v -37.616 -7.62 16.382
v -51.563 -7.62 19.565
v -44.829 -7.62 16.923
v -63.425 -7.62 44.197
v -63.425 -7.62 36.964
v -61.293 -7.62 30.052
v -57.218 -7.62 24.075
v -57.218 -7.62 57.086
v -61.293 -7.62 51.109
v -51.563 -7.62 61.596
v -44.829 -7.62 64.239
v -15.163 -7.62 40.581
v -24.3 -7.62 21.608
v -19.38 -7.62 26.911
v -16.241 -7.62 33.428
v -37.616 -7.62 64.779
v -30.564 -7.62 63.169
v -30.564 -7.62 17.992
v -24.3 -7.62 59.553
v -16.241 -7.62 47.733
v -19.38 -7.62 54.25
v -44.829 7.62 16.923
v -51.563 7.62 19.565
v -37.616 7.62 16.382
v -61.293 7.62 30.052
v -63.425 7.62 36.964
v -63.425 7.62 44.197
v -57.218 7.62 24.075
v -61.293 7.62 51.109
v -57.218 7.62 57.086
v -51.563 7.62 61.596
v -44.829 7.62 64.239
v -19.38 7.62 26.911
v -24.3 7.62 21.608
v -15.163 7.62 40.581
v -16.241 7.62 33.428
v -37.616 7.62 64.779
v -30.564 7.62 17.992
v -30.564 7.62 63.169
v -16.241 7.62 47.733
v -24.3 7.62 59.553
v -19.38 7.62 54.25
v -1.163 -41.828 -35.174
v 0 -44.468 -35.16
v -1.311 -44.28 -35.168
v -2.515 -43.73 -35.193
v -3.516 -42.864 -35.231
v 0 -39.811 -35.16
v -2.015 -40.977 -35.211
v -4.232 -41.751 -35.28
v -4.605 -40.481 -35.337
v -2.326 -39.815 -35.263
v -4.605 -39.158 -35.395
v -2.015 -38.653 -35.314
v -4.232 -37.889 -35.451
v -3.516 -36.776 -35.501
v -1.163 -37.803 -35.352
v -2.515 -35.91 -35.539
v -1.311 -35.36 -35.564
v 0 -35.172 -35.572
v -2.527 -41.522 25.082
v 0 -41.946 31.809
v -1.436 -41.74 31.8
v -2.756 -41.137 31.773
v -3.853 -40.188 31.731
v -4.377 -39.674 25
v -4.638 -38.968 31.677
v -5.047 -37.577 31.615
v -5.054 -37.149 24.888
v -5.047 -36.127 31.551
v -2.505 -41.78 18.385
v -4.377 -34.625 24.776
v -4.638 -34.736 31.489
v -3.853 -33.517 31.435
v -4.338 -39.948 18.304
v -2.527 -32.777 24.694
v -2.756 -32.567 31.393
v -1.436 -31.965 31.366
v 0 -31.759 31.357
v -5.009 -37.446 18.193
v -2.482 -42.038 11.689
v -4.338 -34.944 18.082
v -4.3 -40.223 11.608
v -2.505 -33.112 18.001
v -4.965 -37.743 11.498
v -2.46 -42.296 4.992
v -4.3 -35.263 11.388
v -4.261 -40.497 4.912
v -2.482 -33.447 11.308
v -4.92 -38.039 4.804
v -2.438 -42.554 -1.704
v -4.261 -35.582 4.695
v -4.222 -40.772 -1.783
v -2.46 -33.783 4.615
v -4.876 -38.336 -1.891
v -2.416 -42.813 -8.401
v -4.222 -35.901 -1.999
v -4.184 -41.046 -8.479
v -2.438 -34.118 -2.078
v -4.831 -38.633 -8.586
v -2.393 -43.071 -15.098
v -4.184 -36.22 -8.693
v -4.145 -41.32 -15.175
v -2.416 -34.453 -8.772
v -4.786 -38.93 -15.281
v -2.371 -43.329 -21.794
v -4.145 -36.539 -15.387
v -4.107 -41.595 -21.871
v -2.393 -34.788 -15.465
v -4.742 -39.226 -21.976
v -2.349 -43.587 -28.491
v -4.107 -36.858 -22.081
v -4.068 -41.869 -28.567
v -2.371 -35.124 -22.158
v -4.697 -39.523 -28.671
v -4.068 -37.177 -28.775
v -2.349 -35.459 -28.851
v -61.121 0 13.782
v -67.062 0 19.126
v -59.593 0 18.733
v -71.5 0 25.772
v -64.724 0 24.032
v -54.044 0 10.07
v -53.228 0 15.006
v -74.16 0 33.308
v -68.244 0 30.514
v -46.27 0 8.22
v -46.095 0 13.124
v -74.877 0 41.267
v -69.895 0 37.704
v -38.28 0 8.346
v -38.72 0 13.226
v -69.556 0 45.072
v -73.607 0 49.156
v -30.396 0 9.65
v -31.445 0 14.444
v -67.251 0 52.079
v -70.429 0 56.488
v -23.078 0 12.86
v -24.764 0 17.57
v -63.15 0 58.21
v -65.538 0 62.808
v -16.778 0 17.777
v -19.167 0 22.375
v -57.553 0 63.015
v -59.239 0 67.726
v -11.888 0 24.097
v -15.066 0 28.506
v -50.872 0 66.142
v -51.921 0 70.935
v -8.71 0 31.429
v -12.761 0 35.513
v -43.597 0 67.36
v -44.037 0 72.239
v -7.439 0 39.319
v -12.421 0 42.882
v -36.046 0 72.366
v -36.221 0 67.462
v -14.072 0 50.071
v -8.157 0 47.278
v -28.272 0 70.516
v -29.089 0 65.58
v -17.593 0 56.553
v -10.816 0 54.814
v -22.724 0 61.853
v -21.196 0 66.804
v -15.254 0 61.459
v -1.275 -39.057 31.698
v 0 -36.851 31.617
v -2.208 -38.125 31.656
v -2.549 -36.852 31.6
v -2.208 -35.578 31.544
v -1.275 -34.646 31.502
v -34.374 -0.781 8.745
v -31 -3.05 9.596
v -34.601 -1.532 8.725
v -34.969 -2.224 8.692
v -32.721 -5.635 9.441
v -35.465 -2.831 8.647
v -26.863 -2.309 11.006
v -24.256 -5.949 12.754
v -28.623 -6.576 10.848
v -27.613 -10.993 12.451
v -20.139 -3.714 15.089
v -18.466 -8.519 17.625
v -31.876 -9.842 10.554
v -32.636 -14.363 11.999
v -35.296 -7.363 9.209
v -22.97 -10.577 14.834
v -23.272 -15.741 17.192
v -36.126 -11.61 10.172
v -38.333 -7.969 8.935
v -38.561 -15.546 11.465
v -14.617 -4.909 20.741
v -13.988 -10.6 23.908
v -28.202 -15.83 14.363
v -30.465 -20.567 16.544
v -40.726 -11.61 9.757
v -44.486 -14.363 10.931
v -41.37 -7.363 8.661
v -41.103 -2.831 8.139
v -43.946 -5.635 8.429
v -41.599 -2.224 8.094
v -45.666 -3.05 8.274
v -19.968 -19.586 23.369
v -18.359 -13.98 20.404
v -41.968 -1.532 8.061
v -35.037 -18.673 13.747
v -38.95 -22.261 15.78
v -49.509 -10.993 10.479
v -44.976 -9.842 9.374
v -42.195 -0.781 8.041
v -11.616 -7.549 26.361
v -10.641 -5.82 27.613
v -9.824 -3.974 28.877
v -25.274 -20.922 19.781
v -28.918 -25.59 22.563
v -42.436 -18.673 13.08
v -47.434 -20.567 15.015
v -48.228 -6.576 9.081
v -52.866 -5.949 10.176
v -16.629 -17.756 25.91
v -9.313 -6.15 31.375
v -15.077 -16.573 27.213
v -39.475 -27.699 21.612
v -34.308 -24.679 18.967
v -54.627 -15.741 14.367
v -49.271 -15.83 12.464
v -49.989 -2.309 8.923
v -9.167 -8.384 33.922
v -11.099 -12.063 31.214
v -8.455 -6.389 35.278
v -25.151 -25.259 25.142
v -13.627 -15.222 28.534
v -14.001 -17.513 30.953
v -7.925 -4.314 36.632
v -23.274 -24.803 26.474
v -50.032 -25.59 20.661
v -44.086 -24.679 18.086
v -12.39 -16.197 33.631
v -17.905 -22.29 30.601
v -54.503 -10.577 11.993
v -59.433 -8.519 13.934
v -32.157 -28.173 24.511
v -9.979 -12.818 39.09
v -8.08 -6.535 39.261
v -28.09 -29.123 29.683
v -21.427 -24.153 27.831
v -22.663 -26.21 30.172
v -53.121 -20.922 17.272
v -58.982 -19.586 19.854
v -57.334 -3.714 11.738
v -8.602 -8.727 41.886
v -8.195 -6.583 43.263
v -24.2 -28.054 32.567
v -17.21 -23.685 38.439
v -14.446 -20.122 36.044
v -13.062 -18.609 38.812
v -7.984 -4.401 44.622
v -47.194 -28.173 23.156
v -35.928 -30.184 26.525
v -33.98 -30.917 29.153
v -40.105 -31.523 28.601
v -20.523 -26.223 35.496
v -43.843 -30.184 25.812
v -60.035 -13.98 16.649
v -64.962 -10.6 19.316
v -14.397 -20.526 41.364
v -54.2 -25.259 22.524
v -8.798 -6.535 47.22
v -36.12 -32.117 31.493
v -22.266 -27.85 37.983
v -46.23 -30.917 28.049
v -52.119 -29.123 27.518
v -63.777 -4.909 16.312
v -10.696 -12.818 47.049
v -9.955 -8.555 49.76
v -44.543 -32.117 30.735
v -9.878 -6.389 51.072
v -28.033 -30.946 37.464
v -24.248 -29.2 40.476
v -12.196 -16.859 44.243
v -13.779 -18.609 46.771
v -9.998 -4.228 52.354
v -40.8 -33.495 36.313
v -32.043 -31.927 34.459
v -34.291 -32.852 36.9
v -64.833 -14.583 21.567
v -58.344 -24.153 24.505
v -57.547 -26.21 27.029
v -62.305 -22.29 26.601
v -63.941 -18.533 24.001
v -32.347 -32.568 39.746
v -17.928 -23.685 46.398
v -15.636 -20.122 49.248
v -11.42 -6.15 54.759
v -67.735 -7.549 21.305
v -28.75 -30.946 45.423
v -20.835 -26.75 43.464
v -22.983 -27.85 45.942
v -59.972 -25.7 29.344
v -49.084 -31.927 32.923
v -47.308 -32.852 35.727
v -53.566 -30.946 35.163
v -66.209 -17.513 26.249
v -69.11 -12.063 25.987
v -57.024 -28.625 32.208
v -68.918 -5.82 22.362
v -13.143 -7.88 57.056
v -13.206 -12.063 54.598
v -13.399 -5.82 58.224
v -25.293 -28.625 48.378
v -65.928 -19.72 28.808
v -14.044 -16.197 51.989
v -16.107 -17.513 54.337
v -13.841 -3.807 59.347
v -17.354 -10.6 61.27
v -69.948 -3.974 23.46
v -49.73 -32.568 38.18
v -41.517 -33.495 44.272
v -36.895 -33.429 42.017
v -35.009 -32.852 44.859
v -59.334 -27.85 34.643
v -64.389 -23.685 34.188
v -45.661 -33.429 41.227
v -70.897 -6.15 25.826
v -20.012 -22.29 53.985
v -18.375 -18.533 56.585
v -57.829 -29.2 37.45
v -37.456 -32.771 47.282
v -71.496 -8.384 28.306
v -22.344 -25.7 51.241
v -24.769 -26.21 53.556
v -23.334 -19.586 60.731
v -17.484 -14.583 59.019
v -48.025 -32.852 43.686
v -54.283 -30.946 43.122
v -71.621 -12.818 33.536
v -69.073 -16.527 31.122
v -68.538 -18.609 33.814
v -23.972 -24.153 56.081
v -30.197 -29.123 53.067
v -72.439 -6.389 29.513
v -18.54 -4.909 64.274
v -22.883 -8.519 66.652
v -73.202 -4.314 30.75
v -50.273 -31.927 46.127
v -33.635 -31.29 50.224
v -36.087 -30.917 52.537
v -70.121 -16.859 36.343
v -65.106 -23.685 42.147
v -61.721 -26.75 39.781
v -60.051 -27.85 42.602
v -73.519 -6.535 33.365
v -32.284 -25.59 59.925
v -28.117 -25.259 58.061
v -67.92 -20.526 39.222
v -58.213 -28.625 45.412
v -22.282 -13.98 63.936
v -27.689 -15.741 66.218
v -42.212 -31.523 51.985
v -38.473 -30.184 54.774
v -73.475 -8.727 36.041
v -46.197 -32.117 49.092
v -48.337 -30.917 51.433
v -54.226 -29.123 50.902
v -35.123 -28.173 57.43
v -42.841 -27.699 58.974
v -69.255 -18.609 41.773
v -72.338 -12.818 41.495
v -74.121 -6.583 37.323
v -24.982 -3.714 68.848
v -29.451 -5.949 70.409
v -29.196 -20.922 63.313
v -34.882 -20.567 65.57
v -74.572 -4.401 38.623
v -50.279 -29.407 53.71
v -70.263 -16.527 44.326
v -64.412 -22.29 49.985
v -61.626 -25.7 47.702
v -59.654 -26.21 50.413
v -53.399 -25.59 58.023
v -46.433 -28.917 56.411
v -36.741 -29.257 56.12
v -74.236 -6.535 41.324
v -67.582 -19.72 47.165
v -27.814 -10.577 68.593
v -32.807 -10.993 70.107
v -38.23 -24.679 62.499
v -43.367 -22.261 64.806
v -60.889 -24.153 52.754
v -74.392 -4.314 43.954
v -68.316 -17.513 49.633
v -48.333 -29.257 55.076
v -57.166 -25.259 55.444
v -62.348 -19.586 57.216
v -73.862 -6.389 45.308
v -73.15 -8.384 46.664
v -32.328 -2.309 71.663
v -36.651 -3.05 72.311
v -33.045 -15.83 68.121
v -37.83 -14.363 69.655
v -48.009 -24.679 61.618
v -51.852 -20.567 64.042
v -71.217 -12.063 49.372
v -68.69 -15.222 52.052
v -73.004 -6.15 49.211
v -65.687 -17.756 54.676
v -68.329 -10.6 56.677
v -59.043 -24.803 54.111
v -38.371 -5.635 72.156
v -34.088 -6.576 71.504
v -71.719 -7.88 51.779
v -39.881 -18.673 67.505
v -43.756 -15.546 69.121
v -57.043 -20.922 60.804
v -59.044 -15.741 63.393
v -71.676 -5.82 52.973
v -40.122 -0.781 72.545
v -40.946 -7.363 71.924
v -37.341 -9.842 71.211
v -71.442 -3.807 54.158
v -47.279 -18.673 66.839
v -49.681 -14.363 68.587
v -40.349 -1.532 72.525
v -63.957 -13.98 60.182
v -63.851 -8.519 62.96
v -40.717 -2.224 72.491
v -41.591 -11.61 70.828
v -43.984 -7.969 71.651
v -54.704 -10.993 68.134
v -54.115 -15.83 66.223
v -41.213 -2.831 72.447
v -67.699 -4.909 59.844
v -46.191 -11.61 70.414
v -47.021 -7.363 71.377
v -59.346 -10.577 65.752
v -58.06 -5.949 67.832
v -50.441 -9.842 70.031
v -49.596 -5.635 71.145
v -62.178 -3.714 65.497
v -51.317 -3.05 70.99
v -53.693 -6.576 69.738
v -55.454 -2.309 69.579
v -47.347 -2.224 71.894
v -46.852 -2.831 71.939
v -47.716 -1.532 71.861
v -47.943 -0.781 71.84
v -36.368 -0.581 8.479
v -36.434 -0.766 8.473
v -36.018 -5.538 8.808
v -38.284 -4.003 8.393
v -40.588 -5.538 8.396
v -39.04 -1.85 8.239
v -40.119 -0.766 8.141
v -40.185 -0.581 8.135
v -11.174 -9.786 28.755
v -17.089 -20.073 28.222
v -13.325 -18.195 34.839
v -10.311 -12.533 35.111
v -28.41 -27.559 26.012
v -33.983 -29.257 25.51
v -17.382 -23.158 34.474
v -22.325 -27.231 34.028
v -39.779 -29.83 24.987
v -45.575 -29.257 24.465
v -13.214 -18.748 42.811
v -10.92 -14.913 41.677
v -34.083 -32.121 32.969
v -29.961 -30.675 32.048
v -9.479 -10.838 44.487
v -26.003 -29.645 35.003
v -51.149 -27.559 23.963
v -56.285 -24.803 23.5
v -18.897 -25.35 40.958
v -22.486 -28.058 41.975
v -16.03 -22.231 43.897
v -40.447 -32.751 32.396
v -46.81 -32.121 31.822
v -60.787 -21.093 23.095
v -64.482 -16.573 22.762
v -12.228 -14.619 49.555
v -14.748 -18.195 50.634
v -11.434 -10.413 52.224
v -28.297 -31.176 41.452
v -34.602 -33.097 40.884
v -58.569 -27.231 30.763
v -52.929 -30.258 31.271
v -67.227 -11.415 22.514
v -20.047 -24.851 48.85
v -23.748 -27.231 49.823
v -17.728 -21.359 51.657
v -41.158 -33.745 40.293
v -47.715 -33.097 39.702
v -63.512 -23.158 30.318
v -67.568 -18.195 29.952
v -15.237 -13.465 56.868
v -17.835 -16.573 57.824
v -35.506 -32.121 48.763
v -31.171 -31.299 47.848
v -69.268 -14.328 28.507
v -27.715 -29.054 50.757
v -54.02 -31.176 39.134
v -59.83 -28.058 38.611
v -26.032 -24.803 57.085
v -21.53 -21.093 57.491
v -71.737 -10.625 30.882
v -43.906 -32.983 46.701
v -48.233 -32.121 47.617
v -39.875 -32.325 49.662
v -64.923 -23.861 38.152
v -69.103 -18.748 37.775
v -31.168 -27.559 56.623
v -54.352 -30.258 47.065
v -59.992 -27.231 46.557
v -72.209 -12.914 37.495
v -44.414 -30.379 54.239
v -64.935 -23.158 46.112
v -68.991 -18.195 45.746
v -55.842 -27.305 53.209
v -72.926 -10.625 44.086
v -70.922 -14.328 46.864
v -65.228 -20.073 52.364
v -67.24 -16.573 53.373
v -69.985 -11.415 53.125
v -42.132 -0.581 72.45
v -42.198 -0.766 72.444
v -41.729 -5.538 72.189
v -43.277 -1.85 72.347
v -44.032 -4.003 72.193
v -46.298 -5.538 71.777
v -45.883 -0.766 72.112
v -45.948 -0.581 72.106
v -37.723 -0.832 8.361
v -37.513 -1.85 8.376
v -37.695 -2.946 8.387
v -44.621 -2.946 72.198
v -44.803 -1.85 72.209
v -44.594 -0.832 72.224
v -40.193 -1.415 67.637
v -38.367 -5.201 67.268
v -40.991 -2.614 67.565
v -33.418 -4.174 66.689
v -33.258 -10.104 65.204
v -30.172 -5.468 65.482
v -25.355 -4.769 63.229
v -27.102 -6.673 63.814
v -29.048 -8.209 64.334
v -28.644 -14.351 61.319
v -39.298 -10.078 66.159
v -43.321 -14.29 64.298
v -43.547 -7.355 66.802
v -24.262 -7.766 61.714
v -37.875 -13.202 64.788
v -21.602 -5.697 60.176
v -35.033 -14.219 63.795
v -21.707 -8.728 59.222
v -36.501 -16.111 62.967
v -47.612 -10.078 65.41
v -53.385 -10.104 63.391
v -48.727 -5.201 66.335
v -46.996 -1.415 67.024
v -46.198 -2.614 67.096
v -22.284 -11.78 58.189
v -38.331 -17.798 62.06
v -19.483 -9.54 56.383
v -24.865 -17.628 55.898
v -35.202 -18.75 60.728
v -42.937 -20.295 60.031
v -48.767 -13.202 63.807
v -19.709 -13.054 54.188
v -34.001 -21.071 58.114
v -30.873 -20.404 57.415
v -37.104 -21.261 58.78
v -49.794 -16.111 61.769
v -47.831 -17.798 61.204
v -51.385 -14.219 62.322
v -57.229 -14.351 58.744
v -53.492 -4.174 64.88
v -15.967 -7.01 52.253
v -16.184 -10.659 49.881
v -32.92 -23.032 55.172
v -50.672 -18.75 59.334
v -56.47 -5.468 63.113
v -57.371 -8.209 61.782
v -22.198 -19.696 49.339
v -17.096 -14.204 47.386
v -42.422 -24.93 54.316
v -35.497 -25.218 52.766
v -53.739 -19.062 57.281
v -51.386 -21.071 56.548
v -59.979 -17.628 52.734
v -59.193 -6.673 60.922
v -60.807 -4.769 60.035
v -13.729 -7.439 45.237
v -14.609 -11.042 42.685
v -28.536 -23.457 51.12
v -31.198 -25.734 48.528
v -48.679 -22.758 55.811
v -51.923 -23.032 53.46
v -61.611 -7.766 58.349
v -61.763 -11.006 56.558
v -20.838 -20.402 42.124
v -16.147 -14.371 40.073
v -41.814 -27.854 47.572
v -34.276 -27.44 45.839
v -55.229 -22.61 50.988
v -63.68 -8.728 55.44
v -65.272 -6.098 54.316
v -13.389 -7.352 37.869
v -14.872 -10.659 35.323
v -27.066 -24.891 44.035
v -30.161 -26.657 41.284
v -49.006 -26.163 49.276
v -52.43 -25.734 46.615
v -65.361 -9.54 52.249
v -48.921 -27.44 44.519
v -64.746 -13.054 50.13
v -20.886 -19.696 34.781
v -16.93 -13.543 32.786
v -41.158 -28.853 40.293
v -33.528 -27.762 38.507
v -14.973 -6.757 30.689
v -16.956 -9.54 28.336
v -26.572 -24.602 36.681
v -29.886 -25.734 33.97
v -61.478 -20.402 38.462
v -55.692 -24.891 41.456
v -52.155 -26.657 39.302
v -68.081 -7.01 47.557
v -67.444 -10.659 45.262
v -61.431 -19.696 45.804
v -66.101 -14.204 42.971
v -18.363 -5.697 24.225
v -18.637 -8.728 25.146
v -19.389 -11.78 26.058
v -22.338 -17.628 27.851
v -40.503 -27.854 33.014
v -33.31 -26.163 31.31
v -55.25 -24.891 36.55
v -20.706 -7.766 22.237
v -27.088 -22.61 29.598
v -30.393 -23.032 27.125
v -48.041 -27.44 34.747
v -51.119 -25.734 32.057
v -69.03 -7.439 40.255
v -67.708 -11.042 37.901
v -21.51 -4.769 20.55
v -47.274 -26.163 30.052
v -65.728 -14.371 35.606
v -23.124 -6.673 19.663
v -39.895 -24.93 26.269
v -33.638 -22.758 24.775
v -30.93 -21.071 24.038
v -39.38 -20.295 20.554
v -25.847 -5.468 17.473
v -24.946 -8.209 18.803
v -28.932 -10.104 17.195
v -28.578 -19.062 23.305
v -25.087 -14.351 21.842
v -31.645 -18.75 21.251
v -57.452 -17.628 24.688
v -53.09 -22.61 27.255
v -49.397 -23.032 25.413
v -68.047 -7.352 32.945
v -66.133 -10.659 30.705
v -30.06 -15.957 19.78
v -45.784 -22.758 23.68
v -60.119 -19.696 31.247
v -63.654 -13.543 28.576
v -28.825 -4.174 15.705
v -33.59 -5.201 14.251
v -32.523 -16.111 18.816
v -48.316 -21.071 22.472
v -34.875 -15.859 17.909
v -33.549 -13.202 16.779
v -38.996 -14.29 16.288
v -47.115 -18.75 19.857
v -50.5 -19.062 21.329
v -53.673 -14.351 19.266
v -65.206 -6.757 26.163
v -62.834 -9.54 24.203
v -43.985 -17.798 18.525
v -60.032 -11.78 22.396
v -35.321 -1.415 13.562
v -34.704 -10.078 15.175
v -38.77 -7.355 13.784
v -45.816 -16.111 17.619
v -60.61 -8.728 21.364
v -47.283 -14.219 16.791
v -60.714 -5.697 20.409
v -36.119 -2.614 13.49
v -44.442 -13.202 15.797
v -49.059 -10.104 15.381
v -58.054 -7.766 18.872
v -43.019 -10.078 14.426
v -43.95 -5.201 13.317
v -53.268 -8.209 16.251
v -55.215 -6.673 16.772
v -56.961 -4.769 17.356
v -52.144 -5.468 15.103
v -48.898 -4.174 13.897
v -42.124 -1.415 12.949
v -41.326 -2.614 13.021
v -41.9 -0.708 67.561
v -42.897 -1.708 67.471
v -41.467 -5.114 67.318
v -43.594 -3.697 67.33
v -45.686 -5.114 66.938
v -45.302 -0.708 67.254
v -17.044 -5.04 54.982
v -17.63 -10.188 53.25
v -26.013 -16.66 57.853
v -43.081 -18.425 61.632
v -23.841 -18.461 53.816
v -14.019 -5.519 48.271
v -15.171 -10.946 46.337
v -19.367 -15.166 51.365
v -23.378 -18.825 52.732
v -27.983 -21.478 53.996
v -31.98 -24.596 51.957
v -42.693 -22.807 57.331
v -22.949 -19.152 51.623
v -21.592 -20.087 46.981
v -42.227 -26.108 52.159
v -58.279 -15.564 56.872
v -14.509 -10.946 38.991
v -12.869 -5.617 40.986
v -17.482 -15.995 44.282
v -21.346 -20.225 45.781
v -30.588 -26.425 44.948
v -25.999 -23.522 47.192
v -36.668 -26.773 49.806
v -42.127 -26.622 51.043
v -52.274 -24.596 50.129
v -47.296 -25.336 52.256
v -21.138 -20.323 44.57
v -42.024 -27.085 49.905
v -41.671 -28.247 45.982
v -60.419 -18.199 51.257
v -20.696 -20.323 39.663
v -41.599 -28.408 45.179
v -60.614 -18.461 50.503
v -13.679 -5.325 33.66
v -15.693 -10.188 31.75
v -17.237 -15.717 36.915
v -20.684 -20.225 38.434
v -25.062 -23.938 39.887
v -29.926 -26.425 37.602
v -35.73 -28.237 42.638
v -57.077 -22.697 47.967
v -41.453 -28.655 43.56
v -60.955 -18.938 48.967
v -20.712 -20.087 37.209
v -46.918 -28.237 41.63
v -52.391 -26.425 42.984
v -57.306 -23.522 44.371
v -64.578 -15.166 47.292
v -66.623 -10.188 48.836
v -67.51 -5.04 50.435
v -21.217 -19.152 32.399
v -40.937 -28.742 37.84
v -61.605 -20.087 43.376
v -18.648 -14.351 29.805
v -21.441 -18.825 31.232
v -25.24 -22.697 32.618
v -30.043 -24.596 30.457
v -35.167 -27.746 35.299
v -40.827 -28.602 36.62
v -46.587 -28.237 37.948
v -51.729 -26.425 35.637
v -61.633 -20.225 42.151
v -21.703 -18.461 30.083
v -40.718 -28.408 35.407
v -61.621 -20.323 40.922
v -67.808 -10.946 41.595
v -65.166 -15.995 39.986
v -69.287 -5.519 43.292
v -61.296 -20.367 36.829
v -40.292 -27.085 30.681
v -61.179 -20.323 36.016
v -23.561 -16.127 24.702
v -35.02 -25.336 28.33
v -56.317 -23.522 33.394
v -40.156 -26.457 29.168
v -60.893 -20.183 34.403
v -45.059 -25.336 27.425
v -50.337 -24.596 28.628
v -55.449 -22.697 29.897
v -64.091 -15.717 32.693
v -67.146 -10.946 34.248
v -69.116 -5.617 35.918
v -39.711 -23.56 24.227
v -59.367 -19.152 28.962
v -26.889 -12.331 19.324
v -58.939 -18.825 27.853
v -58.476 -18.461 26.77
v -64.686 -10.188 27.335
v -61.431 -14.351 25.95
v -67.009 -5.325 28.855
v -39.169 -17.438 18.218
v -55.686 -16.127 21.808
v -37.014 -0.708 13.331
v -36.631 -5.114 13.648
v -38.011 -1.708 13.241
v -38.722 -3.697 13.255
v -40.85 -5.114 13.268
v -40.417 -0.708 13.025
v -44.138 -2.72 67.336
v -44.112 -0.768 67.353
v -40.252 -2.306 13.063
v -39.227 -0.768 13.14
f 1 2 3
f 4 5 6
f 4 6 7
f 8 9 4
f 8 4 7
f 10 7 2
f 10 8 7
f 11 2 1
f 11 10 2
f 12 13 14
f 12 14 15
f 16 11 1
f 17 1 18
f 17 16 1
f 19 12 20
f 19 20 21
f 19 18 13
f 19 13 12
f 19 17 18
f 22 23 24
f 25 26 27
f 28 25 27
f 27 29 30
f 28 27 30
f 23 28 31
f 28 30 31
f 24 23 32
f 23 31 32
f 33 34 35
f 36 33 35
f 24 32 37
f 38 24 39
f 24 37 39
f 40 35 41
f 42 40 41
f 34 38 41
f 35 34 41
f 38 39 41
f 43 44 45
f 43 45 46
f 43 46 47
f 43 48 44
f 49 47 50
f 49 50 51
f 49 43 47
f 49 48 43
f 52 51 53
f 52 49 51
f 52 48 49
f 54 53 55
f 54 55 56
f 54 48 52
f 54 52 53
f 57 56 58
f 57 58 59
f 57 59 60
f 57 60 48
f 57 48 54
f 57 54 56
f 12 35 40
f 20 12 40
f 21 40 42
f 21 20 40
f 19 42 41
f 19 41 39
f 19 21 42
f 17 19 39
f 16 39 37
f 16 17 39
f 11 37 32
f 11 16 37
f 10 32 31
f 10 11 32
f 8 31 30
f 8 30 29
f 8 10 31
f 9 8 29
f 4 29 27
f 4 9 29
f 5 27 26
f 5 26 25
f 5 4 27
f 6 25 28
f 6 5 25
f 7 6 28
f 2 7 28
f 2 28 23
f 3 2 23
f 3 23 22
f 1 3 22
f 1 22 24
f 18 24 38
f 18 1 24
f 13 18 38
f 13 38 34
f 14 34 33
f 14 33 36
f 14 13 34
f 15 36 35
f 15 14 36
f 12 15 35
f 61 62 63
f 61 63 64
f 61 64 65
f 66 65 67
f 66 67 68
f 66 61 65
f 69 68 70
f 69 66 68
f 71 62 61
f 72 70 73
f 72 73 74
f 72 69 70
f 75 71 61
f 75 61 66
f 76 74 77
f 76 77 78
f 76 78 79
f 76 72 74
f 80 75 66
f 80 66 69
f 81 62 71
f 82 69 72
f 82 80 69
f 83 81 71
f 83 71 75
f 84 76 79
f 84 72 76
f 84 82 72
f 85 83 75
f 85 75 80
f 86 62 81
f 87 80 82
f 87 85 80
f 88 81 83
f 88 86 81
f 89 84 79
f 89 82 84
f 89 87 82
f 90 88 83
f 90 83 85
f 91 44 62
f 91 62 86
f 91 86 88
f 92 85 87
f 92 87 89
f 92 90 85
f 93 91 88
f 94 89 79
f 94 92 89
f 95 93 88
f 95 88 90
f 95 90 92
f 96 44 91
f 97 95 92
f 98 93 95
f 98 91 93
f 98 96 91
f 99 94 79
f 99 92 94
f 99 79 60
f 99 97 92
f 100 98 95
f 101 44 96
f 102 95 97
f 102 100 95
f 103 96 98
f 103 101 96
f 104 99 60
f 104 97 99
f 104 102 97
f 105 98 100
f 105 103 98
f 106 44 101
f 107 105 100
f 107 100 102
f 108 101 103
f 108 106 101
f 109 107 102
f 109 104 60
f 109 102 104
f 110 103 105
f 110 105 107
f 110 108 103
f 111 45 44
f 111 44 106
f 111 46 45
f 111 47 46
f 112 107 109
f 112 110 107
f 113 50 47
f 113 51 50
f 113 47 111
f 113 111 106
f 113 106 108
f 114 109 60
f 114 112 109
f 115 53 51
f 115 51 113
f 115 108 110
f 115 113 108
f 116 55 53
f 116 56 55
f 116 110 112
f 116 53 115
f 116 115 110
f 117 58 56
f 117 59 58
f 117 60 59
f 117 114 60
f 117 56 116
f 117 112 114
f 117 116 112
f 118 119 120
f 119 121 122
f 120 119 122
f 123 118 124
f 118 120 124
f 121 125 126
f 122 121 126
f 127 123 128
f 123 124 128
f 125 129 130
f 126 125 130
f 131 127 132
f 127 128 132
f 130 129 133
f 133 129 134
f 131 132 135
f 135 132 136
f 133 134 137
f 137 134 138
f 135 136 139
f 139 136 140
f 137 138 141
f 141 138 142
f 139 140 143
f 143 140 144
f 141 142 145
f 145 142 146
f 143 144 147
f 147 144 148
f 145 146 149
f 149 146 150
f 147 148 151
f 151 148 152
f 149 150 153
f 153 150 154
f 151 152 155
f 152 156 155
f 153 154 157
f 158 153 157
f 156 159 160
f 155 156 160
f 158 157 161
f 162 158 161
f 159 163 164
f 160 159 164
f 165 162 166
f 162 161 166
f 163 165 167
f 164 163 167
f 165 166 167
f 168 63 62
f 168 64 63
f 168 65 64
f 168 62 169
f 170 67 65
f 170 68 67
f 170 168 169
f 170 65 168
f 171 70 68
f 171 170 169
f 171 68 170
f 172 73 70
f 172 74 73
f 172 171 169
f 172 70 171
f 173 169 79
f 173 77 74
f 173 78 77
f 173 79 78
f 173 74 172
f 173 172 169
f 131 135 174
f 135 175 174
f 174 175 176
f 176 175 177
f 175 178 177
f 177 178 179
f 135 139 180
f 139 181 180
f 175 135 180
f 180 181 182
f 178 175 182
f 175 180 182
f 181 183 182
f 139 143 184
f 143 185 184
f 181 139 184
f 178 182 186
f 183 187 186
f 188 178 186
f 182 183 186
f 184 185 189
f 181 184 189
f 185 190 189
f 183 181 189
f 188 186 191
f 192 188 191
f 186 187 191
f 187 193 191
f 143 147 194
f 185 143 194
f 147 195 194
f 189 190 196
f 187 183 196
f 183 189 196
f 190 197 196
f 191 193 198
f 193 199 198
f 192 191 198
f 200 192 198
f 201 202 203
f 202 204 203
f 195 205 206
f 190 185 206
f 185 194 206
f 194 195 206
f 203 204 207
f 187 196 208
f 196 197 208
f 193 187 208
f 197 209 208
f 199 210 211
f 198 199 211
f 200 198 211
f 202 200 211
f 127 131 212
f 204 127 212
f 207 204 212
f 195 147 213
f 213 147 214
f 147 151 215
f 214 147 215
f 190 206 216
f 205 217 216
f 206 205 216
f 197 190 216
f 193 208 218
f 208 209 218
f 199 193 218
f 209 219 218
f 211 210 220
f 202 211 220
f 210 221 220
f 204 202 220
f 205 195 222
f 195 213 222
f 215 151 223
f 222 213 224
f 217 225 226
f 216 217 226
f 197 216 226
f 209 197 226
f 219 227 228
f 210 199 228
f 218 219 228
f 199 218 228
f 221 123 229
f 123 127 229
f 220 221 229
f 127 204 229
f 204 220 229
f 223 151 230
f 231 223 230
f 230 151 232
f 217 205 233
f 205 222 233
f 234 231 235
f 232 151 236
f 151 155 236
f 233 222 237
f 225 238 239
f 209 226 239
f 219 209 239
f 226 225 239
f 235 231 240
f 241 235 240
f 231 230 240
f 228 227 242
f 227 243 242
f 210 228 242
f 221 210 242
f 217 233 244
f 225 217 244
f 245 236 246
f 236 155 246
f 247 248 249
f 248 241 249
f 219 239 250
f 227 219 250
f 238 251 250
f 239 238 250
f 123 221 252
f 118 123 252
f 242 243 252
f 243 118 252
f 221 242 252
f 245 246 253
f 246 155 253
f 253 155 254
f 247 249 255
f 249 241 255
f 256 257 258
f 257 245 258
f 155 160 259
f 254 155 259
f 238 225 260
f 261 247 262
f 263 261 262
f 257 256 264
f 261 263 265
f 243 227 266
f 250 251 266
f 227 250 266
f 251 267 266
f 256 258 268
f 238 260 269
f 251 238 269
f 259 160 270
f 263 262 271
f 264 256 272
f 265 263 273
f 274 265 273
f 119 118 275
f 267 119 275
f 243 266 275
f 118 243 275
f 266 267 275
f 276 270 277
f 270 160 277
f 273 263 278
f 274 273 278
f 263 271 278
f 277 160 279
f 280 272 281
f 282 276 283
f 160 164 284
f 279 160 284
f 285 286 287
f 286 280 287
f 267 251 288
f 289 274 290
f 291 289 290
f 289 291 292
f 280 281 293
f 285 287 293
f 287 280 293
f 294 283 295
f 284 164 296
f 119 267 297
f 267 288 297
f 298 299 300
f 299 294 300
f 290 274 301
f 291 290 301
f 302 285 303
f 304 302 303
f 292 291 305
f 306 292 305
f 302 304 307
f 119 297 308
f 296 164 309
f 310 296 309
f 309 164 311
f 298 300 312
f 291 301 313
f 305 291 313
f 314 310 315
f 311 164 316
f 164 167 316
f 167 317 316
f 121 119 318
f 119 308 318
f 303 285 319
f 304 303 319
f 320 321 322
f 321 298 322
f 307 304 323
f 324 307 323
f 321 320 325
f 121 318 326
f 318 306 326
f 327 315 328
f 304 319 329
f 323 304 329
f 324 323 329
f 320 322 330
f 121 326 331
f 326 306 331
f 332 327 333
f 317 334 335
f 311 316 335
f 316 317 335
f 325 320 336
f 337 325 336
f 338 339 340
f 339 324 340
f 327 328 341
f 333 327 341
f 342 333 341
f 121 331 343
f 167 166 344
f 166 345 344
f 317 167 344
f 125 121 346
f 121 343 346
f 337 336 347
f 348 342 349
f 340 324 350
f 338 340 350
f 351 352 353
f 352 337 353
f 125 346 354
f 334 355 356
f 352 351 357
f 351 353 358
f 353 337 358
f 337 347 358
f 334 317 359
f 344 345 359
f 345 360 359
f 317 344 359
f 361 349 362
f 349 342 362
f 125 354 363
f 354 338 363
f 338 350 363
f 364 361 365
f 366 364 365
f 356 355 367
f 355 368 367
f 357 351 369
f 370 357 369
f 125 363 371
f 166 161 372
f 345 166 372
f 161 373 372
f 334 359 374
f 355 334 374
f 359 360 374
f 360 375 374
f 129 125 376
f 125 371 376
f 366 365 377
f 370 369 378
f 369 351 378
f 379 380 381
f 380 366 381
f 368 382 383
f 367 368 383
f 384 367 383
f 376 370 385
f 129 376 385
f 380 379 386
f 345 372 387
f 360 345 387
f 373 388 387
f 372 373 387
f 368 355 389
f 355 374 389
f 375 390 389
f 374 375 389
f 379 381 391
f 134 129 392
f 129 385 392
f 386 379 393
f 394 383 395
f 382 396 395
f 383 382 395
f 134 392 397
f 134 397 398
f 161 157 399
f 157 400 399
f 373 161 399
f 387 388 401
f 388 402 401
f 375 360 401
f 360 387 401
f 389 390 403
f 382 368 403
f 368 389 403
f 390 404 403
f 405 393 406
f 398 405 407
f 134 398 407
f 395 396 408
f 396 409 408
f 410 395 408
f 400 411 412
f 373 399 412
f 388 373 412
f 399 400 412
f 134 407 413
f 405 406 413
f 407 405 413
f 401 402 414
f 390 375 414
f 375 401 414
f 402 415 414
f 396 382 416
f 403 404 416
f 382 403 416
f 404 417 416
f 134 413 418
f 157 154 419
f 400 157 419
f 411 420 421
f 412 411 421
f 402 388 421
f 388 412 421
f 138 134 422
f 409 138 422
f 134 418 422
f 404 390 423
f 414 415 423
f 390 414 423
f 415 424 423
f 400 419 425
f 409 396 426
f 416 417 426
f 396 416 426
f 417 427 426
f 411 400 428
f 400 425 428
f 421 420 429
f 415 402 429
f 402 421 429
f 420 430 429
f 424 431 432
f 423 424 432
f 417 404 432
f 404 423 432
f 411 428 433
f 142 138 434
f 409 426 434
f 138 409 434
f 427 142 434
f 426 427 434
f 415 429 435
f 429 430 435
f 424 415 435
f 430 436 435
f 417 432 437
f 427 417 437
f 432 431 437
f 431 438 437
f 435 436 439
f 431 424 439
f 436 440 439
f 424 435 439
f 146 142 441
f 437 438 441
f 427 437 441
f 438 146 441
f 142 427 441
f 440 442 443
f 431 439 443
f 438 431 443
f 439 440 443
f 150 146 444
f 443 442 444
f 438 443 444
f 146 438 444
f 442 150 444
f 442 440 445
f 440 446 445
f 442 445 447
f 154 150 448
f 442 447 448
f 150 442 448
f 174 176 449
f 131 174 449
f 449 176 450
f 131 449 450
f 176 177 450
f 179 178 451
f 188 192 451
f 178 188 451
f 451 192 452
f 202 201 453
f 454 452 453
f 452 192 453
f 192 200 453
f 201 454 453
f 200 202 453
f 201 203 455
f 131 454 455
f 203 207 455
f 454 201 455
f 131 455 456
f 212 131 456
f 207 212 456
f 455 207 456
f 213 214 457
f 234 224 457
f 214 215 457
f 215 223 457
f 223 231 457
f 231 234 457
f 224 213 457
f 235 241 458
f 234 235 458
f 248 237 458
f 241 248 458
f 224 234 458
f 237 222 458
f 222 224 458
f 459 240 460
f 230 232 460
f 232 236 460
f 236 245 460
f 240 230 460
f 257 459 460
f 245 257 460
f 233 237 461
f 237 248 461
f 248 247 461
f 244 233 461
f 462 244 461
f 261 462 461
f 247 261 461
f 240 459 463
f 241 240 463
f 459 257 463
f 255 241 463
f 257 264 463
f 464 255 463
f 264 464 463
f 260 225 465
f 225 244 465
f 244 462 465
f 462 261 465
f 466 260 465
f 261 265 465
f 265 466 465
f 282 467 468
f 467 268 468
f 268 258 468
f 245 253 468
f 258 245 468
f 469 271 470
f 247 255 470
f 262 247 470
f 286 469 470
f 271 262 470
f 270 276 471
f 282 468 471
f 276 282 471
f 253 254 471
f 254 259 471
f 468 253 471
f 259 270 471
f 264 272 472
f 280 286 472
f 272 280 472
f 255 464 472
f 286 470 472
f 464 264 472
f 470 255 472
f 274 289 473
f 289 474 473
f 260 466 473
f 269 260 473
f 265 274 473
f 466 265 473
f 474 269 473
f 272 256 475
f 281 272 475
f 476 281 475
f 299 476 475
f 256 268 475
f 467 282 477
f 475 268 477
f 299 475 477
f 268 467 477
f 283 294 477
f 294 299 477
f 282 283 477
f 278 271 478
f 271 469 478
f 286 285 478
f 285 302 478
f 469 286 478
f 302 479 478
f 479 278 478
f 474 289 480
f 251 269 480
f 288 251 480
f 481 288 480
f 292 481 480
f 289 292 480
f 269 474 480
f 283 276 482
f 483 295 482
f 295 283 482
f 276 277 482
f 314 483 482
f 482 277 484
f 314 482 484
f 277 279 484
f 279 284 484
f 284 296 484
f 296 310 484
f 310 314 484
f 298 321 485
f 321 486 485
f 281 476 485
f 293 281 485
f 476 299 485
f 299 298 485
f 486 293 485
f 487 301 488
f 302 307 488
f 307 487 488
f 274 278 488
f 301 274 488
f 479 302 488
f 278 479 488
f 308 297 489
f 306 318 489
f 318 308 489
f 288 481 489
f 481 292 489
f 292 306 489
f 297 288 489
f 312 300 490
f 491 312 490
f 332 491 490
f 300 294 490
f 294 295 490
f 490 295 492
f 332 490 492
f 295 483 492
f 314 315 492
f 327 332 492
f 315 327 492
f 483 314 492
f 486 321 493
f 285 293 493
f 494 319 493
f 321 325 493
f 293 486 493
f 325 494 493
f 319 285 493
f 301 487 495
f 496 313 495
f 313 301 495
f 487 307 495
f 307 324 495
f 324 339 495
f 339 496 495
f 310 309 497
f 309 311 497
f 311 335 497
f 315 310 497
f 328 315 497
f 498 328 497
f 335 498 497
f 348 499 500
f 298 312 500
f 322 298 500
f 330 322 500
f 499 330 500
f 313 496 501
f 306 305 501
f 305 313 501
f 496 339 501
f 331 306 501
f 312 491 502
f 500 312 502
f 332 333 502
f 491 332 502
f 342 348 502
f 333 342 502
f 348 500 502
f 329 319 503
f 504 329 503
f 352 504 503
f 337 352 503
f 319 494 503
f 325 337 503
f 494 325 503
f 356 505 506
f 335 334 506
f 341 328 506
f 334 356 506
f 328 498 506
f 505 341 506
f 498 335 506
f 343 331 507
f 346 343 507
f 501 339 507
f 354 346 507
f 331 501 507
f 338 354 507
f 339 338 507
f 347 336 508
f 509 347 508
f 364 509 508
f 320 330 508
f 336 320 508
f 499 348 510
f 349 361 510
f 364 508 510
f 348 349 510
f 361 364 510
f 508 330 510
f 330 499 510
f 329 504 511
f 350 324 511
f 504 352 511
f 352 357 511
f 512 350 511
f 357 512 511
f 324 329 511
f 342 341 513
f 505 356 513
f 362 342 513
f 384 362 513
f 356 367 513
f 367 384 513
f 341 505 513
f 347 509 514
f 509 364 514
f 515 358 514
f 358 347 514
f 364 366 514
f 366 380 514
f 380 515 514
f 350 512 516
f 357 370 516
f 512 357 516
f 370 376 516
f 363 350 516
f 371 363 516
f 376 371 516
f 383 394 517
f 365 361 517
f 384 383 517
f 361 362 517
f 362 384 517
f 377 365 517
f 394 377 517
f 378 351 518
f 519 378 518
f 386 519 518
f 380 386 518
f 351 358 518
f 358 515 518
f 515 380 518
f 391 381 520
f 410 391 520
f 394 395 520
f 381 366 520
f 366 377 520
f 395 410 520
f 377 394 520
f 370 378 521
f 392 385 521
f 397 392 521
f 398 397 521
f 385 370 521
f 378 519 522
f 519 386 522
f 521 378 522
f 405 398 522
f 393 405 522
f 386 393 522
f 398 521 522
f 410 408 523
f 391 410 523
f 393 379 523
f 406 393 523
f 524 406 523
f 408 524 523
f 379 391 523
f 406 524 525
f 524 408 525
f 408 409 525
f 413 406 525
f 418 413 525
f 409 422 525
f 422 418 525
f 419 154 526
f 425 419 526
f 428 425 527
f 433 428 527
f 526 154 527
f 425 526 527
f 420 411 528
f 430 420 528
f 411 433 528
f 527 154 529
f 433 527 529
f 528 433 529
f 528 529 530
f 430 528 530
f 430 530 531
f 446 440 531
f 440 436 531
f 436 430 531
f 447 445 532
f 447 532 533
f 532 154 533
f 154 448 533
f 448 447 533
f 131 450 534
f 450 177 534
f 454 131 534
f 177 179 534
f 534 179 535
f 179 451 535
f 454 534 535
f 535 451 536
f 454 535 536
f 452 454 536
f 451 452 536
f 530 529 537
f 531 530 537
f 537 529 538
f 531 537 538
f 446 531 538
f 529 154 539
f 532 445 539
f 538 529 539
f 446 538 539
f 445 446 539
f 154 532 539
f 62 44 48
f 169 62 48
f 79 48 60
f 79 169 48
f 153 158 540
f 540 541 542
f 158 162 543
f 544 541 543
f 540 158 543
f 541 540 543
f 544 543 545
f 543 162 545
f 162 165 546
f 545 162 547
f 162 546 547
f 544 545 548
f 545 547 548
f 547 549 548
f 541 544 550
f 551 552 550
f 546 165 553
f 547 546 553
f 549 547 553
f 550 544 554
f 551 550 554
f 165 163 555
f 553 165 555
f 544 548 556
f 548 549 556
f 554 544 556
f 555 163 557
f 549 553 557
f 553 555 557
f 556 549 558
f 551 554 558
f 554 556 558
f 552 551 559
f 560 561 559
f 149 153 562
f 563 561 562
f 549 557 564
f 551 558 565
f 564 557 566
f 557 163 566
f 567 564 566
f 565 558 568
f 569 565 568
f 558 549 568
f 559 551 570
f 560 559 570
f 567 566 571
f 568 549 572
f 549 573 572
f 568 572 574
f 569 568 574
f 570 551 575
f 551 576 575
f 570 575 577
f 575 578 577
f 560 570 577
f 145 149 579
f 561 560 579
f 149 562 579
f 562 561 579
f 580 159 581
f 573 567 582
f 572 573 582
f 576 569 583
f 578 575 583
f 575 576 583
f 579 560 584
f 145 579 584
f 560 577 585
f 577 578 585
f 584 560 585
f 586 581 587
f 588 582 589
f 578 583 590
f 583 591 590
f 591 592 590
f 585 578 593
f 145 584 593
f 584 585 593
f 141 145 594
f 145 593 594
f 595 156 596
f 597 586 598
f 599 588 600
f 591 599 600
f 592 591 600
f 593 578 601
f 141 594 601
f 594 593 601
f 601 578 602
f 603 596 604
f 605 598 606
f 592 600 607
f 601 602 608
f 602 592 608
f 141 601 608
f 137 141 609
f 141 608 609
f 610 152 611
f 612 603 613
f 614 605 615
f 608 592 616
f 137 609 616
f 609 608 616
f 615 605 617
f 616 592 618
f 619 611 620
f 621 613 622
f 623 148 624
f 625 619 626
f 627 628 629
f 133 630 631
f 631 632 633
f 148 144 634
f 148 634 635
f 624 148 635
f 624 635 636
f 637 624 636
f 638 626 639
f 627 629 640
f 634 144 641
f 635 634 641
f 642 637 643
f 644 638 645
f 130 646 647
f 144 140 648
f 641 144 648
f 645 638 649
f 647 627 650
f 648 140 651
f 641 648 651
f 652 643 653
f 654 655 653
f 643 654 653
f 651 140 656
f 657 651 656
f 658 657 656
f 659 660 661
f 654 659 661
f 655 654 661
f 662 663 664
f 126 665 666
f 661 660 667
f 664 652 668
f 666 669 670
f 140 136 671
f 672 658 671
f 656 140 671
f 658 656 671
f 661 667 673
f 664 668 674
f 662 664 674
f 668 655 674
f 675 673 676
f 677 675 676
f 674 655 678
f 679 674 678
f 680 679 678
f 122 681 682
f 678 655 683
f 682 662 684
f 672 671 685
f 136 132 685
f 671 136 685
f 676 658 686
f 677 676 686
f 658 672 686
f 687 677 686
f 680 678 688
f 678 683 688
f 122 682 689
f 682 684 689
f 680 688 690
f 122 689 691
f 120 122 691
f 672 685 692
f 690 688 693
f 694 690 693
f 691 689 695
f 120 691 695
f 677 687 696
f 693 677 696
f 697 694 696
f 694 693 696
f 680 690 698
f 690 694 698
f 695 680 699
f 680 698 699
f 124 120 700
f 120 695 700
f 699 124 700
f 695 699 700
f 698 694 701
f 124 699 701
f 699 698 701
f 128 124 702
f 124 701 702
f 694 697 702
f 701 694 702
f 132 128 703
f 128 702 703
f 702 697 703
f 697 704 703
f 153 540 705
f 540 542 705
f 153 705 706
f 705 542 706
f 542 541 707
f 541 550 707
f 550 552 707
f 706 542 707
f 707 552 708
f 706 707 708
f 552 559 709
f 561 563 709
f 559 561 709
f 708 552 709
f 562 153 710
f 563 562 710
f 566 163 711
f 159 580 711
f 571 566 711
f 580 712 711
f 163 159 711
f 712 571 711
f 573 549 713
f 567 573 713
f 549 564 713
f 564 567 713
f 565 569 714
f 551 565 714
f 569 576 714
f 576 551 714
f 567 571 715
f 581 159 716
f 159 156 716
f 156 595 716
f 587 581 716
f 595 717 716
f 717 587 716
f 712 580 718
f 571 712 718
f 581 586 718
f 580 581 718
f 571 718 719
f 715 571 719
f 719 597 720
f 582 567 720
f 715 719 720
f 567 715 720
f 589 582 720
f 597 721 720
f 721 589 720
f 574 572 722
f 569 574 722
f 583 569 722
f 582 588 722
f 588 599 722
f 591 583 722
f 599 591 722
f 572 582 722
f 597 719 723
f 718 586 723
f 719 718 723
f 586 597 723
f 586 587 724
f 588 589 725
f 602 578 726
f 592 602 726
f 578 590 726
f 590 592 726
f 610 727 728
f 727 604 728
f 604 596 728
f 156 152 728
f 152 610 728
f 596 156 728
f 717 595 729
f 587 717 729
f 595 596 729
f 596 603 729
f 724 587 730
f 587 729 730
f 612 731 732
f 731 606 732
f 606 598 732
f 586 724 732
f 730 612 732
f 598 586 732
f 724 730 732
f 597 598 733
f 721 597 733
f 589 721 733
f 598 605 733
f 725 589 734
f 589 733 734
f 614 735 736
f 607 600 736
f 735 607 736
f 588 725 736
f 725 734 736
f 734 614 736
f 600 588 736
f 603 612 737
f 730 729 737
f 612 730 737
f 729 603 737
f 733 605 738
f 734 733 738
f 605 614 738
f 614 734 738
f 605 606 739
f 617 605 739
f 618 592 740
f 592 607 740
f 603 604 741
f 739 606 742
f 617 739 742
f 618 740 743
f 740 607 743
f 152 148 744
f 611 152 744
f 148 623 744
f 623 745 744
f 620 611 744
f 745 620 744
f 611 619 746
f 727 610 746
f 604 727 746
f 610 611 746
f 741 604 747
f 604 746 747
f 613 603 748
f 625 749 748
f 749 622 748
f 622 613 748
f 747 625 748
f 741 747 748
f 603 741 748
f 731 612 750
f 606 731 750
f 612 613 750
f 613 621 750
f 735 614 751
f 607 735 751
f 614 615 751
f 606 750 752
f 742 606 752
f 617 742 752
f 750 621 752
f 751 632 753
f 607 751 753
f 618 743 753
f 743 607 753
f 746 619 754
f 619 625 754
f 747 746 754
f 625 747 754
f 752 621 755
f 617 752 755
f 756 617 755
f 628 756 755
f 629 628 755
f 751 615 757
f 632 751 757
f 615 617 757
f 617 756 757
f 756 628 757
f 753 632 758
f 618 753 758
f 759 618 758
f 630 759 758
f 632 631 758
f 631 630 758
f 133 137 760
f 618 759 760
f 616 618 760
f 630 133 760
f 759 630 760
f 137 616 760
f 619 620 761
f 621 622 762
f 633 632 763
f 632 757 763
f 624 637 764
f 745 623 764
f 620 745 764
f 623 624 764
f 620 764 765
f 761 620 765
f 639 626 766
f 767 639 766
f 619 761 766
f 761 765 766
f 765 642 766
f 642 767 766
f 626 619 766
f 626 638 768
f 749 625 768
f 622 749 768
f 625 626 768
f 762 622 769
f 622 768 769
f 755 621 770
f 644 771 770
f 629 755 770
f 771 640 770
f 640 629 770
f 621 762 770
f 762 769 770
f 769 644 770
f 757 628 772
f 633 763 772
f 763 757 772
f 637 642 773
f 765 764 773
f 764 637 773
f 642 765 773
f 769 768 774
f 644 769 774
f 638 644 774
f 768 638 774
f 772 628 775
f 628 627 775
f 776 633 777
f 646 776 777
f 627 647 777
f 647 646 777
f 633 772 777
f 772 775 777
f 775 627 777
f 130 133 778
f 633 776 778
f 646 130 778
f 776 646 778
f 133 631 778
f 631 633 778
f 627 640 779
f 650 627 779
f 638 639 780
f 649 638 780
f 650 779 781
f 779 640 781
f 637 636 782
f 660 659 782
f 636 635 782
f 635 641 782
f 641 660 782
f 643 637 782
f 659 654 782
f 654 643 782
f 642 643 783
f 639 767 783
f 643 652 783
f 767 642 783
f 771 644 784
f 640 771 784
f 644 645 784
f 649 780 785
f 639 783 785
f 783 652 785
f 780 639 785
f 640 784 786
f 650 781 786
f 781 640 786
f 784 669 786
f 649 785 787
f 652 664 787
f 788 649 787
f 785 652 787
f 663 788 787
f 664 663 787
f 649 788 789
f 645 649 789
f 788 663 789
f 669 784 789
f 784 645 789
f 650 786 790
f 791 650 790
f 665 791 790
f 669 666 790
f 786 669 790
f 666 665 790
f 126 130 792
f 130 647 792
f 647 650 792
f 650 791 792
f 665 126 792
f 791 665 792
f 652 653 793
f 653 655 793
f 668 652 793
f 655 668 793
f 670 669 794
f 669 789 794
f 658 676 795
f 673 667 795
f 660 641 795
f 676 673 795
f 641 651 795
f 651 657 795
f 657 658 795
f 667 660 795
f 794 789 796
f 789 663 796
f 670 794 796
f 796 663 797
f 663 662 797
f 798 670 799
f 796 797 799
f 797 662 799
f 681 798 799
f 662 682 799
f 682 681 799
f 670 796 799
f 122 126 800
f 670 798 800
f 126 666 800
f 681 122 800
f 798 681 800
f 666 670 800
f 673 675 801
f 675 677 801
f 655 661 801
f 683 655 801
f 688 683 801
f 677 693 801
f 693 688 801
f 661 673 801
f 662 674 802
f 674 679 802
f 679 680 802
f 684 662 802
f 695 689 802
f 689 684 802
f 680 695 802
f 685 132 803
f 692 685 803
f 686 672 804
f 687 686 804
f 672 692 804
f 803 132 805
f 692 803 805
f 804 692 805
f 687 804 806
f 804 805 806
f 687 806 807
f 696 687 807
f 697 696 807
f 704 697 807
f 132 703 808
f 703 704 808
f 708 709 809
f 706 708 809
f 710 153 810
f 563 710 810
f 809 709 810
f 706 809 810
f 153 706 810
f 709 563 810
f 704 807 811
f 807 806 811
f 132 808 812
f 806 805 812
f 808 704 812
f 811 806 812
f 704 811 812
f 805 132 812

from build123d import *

# Parameters (mm, degrees)
F1_ANGLE = 180
F3_ANGLE = 180
F4_R     = 24.2663085854
F5_DEPTH = 7.62


with BuildPart() as f1:
    # F0 (on Front) → F1 (revolve)
    with BuildSketch(Plane.XZ):
        with BuildLine():
            Line((-38.7196275934, 13.2255986375), (-38.2800213993, 8.3463666961))
            ThreePointArc((-38.2800213993, 8.3463666961), (-7.5495005614, 43.3208717732), (-44.0366044641, 72.2392424941))
            Line((-44.0366044641, 72.2392424941), (-43.5969982699, 67.3600105527))
            ThreePointArc((-43.5969982699, 67.3600105527), (-12.4213336536, 42.8819321962), (-38.7196275934, 13.2255986375))
        make_face()
    revolve(axis=Axis((-41.1583129317, 0, 40.2928045951), (0.0897339434, 0, -0.9959657722)), revolution_arc=F1_ANGLE)


with BuildPart() as f3:
    # F2 (on Right) → F3 (revolve)
    with BuildSketch(Plane.YZ):
        Polygon((-36.8508817573, 31.6169658247), (-41.9459577987, 31.8088370815), (-44.467875052, -35.1598188281), (-39.8106686771, -35.1598188281), align=None)
    revolve(axis=Axis((0, -38.3307752172, -1.7714265017), (0, -0.0442801168, -0.9990191546)), revolution_arc=F3_ANGLE)


with BuildPart() as f5:
    # F4 (on Front) → F5 (new body, symmetric)
    with BuildSketch(Plane.XZ):
        with Locations((-39.4293889403, 40.580611676)):
            Circle(F4_R)
    extrude(amount=F5_DEPTH, both=True)


solid = Compound([f1.part, f3.part, f5.part])
